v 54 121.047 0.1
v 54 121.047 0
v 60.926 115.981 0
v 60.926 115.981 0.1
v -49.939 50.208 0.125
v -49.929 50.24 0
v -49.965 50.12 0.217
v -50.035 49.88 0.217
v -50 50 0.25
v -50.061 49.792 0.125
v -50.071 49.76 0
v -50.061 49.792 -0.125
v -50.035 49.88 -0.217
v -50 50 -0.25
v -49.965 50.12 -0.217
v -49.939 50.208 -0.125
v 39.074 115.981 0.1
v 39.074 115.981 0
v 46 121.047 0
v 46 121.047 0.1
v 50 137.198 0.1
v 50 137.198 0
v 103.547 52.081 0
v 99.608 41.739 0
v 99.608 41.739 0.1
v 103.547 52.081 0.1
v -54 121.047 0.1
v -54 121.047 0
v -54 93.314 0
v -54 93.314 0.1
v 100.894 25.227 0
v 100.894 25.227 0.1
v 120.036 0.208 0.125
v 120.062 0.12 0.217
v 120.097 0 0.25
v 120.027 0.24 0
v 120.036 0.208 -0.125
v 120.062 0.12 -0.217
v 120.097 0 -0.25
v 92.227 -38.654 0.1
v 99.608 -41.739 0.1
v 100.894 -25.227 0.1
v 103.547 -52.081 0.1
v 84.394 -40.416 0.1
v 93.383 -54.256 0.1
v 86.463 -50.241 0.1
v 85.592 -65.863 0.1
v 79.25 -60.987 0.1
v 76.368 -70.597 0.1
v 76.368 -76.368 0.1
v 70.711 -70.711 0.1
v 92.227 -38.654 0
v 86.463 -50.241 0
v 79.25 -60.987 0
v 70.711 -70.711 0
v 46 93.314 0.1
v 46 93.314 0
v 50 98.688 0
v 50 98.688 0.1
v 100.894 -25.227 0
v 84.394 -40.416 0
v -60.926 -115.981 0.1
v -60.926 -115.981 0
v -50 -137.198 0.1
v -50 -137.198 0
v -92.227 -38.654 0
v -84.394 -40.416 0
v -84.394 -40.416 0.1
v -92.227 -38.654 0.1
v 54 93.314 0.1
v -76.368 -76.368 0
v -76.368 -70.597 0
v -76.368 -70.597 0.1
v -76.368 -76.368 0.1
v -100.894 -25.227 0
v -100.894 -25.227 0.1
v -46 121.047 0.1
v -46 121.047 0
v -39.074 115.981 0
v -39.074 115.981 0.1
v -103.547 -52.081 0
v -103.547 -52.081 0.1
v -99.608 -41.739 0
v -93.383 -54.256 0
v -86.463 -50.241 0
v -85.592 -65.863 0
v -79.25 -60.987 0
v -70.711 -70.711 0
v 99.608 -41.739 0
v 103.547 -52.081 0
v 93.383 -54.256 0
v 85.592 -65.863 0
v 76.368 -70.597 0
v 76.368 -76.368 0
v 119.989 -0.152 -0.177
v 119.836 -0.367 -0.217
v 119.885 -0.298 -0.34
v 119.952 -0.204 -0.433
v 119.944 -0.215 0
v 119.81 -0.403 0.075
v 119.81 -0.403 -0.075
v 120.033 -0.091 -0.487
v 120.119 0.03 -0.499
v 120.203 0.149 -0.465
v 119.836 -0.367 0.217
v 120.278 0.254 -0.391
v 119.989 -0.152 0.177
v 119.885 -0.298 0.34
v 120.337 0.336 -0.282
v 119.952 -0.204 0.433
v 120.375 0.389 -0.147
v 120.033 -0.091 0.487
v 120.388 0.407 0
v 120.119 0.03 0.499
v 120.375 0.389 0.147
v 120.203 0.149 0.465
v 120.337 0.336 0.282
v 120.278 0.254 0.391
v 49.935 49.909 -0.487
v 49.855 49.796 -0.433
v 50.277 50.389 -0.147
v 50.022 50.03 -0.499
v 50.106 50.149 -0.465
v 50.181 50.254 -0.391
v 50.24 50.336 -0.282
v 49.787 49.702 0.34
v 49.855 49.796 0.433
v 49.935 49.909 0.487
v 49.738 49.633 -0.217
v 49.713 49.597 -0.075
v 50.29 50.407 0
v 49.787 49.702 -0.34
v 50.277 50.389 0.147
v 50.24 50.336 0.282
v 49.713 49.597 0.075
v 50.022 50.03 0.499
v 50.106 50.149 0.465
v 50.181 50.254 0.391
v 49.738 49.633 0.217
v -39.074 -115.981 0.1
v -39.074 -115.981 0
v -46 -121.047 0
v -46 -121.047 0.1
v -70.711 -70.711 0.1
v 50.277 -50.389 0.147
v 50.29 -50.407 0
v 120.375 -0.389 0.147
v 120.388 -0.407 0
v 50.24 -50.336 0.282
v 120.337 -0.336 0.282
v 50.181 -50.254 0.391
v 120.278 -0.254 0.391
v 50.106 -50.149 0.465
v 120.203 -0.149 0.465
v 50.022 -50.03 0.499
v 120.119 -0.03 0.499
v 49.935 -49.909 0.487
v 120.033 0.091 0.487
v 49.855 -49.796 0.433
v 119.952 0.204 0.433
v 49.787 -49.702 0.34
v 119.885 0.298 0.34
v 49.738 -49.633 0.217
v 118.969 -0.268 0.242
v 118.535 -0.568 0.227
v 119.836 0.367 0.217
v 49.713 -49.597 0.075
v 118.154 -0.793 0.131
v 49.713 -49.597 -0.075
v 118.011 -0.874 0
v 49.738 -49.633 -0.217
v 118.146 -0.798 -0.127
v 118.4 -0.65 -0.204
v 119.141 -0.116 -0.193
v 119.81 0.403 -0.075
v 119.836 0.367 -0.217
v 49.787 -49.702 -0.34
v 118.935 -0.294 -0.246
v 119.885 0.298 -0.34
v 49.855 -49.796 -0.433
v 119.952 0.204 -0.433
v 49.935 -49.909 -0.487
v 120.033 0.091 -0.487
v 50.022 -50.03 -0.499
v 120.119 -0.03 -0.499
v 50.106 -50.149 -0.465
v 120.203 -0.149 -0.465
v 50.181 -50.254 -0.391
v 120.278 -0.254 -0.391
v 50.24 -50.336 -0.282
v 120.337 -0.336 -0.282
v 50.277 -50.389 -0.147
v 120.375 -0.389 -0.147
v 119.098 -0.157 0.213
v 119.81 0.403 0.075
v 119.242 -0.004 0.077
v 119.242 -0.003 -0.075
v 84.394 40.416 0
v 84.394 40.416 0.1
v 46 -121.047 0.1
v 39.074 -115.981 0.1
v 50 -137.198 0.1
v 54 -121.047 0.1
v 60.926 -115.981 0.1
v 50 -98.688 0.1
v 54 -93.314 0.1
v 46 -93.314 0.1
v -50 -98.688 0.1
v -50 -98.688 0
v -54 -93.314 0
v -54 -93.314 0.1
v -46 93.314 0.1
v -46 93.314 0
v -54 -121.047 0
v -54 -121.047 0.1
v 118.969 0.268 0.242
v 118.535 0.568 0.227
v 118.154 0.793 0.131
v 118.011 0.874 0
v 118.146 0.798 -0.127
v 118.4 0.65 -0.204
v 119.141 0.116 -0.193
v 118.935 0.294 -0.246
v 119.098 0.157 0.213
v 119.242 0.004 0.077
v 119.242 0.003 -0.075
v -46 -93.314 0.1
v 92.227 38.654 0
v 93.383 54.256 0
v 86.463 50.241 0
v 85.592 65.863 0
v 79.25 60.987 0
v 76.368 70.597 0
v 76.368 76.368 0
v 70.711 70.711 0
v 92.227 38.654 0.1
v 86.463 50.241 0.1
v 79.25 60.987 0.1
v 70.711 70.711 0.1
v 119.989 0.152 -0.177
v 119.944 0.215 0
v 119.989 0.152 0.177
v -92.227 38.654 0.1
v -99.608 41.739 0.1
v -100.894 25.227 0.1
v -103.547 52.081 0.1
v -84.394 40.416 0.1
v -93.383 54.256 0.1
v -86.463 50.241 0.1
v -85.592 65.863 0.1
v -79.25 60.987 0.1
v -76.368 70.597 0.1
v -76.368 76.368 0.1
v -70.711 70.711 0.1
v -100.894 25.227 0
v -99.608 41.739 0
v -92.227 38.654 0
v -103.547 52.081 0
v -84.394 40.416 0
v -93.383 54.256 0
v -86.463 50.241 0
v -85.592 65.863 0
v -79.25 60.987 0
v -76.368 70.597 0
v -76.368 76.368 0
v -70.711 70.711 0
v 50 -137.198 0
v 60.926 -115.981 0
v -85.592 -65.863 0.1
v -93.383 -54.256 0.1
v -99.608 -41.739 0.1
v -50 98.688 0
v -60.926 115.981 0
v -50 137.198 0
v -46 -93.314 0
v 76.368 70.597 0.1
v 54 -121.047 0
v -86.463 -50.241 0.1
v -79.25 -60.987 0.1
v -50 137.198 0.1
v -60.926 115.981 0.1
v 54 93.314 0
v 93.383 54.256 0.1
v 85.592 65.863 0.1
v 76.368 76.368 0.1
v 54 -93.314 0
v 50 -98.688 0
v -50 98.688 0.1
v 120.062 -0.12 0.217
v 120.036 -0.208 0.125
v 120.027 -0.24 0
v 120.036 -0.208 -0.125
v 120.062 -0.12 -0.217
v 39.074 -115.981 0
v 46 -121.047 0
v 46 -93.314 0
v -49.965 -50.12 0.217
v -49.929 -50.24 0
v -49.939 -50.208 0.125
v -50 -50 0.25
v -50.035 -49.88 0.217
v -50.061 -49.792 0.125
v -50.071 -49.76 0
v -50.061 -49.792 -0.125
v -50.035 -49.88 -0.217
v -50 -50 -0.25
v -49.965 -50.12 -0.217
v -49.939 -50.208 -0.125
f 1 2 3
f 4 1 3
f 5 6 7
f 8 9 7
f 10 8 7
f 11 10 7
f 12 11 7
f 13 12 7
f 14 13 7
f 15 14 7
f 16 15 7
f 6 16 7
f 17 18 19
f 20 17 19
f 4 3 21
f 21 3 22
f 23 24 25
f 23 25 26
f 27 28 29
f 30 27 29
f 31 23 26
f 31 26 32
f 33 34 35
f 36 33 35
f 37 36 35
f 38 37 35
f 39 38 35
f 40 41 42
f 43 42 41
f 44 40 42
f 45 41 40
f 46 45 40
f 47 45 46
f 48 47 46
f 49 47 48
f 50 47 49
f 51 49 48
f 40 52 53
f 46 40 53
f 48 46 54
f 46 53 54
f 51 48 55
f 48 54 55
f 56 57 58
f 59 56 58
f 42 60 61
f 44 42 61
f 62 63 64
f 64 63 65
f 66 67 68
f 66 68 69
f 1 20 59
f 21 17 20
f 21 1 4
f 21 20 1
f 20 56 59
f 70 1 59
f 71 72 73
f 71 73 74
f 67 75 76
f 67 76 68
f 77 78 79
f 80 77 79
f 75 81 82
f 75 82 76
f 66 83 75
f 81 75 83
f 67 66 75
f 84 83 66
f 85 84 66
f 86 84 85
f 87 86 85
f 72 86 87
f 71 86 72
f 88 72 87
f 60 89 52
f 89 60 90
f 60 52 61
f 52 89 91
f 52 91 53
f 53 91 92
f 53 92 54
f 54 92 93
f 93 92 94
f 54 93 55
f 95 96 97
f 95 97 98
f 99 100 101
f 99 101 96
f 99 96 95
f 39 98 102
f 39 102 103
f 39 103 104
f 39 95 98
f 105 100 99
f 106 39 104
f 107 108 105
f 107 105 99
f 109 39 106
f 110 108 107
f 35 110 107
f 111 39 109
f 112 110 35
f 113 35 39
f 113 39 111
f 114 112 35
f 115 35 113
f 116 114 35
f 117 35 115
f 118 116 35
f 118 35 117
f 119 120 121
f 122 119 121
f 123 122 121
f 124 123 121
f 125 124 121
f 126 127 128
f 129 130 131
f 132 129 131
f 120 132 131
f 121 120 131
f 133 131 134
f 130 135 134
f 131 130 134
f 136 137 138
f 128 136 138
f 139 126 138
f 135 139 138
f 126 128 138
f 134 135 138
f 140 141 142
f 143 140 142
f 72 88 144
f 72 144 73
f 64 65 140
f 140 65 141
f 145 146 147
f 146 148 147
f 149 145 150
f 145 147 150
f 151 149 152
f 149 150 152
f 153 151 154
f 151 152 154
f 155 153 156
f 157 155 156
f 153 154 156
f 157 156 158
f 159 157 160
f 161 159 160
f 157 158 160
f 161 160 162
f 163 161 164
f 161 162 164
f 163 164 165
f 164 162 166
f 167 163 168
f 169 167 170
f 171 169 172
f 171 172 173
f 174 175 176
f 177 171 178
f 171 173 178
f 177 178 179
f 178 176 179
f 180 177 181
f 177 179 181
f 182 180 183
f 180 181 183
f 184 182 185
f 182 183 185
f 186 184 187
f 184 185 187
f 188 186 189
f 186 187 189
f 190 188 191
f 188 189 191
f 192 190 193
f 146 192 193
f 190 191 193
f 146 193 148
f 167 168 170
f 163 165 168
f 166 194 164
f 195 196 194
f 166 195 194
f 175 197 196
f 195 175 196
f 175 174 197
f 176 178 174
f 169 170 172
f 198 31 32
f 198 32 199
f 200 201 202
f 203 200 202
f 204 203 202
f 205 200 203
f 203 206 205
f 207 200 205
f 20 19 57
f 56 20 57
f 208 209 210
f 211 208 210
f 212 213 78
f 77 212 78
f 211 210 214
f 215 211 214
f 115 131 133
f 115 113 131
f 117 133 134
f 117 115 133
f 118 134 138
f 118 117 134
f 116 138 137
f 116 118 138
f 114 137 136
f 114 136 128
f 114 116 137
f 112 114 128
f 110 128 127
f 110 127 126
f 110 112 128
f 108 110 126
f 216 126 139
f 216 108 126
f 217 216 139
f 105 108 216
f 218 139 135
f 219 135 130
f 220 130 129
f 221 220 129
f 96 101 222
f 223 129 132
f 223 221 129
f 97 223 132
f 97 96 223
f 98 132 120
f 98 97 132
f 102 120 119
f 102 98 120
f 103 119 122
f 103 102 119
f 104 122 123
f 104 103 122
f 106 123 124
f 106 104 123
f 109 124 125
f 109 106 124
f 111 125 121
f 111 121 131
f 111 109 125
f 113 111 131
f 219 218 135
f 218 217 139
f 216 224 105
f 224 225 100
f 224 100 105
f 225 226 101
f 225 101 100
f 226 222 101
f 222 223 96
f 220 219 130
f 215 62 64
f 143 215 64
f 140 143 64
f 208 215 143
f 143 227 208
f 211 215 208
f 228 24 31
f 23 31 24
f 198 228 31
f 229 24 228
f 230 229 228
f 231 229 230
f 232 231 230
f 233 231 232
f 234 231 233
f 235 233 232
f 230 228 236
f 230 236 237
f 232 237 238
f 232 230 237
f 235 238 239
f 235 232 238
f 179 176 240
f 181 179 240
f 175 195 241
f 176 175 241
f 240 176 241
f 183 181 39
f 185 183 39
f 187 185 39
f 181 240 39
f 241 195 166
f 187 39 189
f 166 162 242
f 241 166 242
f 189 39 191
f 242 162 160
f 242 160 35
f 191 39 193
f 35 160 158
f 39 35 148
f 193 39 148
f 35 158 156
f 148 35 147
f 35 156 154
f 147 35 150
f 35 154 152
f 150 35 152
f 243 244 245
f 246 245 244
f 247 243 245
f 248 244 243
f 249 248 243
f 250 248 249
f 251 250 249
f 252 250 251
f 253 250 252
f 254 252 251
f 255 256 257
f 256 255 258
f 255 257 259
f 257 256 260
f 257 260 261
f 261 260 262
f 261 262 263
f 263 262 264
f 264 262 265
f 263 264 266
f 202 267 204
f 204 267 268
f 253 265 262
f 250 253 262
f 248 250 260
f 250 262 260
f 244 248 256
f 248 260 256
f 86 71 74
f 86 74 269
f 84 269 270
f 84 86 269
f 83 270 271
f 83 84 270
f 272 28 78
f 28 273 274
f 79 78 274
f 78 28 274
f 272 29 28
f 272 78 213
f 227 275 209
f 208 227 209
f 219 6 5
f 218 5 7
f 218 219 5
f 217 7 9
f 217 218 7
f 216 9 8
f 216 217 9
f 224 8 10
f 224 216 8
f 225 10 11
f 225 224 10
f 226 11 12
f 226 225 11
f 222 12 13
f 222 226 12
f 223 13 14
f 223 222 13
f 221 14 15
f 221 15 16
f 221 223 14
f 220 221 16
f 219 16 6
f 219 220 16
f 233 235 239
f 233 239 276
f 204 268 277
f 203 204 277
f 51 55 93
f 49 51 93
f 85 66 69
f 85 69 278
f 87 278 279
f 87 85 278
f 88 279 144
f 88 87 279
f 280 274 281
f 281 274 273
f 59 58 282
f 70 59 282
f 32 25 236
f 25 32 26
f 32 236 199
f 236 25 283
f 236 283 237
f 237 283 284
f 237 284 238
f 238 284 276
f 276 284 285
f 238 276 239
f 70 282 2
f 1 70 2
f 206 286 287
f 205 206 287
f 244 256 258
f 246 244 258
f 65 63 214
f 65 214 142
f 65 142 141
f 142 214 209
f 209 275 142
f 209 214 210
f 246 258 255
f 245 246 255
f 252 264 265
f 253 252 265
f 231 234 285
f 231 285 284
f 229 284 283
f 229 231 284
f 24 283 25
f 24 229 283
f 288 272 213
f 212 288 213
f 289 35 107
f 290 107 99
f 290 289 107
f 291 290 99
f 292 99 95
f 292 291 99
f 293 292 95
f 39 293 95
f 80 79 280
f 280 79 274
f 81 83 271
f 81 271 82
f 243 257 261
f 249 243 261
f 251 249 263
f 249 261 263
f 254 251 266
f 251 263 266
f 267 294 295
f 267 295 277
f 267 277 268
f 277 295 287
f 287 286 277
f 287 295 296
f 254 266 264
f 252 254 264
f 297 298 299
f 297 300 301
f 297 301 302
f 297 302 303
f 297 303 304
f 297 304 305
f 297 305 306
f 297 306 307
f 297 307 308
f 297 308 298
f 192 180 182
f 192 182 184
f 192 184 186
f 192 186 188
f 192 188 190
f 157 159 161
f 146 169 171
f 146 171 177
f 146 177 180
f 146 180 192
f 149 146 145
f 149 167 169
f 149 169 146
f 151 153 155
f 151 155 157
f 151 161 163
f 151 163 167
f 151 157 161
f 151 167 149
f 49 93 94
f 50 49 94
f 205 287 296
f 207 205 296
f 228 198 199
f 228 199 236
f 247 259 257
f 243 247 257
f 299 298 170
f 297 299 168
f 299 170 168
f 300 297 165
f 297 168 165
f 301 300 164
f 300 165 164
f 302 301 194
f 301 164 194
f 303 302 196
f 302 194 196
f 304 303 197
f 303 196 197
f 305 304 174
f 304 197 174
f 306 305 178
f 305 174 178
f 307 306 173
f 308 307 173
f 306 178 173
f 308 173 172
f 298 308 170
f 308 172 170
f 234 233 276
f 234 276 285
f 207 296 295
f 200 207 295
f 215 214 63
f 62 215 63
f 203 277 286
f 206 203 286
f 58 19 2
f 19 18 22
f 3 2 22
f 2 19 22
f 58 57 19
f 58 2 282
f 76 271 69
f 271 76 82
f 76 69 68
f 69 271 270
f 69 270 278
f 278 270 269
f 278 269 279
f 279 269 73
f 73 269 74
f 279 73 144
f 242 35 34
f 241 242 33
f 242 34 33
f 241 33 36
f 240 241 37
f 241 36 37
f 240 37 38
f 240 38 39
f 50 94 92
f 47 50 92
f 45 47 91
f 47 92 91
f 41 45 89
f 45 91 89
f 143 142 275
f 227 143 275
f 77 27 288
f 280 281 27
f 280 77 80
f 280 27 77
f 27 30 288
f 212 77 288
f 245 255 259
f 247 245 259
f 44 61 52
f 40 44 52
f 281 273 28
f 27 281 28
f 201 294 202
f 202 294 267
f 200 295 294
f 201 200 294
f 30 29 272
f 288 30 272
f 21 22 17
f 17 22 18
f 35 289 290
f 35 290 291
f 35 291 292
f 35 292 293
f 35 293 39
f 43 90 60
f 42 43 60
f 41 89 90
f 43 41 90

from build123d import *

# Parameters (mm, degrees)
EXTRUDE_1_DEPTH   = 0.1
SWEEP_1_PROFILE_R = 0.25
SWEEP_3_PROFILE_R = 0.5
EXTRUDE_2_DEPTH   = 0.1
EXTRUDE_2_2_DEPTH = 0.1
EXTRUDE_2_3_DEPTH = 0.1
EXTRUDE_2_4_DEPTH = 0.1


with BuildPart() as part:
    # 草图1 → 凸台-拉伸1 (new body)
    with BuildSketch(Plane.XY):
        with BuildLine():
            Line((-76.367532368, 70.597450379), (-76.367532368, 76.367532368))
            ThreePointArc((-76.367532368, 76.367532368), (-89.675372689, 60.185775172), (-99.608486096, 41.739064409))
            Line((-99.608486096, 41.739064409), (-103.547392889, 52.081418243))
            Line((-103.547392889, 52.081418243), (-100.893939345, 25.227227425))
            Line((-100.893939345, 25.227227425), (-84.393596676, 40.415809557))
            Line((-84.393596676, 40.415809557), (-92.227129015, 38.654322834))
            ThreePointArc((-92.227129015, 38.654322834), (-83.030625235, 55.730739033), (-70.710678119, 70.710678119))
            Line((-70.710678119, 70.710678119), (-76.367532368, 70.597450379))
        make_face()
    extrude(amount=EXTRUDE_1_DEPTH)


with BuildPart() as body_2:
    # 扫描1: sweep along a path in 草图2
    with BuildLine(Plane.XY) as sweep_1_path:
        Line((-50, 50), (120.097414724, 0))
    # 扫描1 profile (on start of the path) → 扫描1 (sweep)
    with BuildSketch(Plane(origin=(-50, 50, 0), x_dir=(0.28201758324220955, 0.9594092363231779, 0), z_dir=(0.9594092363231779, -0.28201758324220955, 0))):
        Circle(SWEEP_1_PROFILE_R)
    sweep(path=sweep_1_path.line)

    # 扫描3: sweep along a path in 草图10
    with BuildLine(Plane.XY) as sweep_3_path:
        Line((50, 50), (120.097414724, 0))
    # 扫描3 profile (on start of the path) → 扫描3 (sweep)
    with BuildSketch(Plane(origin=(50, 50, 0), x_dir=(0.5807029557109349, 0.8141155183563227, 0), z_dir=(0.8141155183563227, -0.5807029557109349, 0))):
        Circle(SWEEP_3_PROFILE_R)
    sweep(path=sweep_3_path.line)


with BuildPart() as body_3:
    # 镜向3: mirrored copy
    add(part.part.mirror(Plane.ZX))


with BuildPart() as body_4:
    # Mirror 3 2: mirrored copy
    add(body_2.part.mirror(Plane.ZX))


with BuildPart() as body_5:
    # 镜向4: mirrored copy
    add(part.part.mirror(Plane(origin=(0, 0, 0), x_dir=(0, 0, 1), z_dir=(1, 0, 0))))


with BuildPart() as body_6:
    # Mirror 4 2: mirrored copy
    add(body_3.part.mirror(Plane(origin=(0, 0, 0), x_dir=(0, 0, 1), z_dir=(1, 0, 0))))


with BuildPart() as body_7:
    # 草图27 → 凸台-拉伸2 (new body)
    with BuildSketch(Plane.XY):
        Polygon((-50, 137.198385156), (-60.926273457, 115.98084523), (-54, 121.047126497), (-54, 93.313859271), (-50, 98.688027033), (-46, 93.313859271), (-46, 121.047126497), (-39.073726543, 115.98084523), align=None)
    extrude(amount=EXTRUDE_2_DEPTH)


with BuildPart() as body_8:
    # 草图27 → Extrude 2 2 (new body)
    with BuildSketch(Plane.XY):
        Polygon((50, 137.198385156), (39.073726543, 115.98084523), (46, 121.047126497), (46, 93.313859271), (50, 98.688027033), (54, 93.313859271), (54, 121.047126497), (60.926273457, 115.98084523), align=None)
    extrude(amount=EXTRUDE_2_2_DEPTH)


with BuildPart() as body_9:
    # 草图27 → Extrude 2 3 (new body)
    with BuildSketch(Plane.XY):
        Polygon((50, -137.198385156), (60.926273457, -115.98084523), (54, -121.047126497), (54, -93.313859271), (50, -98.688027033), (46, -93.313859271), (46, -121.047126497), (39.073726543, -115.98084523), align=None)
    extrude(amount=EXTRUDE_2_3_DEPTH)


with BuildPart() as body_10:
    # 草图27 → Extrude 2 4 (new body)
    with BuildSketch(Plane.XY):
        Polygon((-50, -137.198385156), (-39.073726543, -115.98084523), (-46, -121.047126497), (-46, -93.313859271), (-50, -98.688027033), (-54, -93.313859271), (-54, -121.047126497), (-60.926273457, -115.98084523), align=None)
    extrude(amount=EXTRUDE_2_4_DEPTH)


solid = Compound([part.part, body_2.part, body_3.part, body_4.part, body_5.part, body_6.part, body_7.part, body_8.part, body_9.part, body_10.part])
